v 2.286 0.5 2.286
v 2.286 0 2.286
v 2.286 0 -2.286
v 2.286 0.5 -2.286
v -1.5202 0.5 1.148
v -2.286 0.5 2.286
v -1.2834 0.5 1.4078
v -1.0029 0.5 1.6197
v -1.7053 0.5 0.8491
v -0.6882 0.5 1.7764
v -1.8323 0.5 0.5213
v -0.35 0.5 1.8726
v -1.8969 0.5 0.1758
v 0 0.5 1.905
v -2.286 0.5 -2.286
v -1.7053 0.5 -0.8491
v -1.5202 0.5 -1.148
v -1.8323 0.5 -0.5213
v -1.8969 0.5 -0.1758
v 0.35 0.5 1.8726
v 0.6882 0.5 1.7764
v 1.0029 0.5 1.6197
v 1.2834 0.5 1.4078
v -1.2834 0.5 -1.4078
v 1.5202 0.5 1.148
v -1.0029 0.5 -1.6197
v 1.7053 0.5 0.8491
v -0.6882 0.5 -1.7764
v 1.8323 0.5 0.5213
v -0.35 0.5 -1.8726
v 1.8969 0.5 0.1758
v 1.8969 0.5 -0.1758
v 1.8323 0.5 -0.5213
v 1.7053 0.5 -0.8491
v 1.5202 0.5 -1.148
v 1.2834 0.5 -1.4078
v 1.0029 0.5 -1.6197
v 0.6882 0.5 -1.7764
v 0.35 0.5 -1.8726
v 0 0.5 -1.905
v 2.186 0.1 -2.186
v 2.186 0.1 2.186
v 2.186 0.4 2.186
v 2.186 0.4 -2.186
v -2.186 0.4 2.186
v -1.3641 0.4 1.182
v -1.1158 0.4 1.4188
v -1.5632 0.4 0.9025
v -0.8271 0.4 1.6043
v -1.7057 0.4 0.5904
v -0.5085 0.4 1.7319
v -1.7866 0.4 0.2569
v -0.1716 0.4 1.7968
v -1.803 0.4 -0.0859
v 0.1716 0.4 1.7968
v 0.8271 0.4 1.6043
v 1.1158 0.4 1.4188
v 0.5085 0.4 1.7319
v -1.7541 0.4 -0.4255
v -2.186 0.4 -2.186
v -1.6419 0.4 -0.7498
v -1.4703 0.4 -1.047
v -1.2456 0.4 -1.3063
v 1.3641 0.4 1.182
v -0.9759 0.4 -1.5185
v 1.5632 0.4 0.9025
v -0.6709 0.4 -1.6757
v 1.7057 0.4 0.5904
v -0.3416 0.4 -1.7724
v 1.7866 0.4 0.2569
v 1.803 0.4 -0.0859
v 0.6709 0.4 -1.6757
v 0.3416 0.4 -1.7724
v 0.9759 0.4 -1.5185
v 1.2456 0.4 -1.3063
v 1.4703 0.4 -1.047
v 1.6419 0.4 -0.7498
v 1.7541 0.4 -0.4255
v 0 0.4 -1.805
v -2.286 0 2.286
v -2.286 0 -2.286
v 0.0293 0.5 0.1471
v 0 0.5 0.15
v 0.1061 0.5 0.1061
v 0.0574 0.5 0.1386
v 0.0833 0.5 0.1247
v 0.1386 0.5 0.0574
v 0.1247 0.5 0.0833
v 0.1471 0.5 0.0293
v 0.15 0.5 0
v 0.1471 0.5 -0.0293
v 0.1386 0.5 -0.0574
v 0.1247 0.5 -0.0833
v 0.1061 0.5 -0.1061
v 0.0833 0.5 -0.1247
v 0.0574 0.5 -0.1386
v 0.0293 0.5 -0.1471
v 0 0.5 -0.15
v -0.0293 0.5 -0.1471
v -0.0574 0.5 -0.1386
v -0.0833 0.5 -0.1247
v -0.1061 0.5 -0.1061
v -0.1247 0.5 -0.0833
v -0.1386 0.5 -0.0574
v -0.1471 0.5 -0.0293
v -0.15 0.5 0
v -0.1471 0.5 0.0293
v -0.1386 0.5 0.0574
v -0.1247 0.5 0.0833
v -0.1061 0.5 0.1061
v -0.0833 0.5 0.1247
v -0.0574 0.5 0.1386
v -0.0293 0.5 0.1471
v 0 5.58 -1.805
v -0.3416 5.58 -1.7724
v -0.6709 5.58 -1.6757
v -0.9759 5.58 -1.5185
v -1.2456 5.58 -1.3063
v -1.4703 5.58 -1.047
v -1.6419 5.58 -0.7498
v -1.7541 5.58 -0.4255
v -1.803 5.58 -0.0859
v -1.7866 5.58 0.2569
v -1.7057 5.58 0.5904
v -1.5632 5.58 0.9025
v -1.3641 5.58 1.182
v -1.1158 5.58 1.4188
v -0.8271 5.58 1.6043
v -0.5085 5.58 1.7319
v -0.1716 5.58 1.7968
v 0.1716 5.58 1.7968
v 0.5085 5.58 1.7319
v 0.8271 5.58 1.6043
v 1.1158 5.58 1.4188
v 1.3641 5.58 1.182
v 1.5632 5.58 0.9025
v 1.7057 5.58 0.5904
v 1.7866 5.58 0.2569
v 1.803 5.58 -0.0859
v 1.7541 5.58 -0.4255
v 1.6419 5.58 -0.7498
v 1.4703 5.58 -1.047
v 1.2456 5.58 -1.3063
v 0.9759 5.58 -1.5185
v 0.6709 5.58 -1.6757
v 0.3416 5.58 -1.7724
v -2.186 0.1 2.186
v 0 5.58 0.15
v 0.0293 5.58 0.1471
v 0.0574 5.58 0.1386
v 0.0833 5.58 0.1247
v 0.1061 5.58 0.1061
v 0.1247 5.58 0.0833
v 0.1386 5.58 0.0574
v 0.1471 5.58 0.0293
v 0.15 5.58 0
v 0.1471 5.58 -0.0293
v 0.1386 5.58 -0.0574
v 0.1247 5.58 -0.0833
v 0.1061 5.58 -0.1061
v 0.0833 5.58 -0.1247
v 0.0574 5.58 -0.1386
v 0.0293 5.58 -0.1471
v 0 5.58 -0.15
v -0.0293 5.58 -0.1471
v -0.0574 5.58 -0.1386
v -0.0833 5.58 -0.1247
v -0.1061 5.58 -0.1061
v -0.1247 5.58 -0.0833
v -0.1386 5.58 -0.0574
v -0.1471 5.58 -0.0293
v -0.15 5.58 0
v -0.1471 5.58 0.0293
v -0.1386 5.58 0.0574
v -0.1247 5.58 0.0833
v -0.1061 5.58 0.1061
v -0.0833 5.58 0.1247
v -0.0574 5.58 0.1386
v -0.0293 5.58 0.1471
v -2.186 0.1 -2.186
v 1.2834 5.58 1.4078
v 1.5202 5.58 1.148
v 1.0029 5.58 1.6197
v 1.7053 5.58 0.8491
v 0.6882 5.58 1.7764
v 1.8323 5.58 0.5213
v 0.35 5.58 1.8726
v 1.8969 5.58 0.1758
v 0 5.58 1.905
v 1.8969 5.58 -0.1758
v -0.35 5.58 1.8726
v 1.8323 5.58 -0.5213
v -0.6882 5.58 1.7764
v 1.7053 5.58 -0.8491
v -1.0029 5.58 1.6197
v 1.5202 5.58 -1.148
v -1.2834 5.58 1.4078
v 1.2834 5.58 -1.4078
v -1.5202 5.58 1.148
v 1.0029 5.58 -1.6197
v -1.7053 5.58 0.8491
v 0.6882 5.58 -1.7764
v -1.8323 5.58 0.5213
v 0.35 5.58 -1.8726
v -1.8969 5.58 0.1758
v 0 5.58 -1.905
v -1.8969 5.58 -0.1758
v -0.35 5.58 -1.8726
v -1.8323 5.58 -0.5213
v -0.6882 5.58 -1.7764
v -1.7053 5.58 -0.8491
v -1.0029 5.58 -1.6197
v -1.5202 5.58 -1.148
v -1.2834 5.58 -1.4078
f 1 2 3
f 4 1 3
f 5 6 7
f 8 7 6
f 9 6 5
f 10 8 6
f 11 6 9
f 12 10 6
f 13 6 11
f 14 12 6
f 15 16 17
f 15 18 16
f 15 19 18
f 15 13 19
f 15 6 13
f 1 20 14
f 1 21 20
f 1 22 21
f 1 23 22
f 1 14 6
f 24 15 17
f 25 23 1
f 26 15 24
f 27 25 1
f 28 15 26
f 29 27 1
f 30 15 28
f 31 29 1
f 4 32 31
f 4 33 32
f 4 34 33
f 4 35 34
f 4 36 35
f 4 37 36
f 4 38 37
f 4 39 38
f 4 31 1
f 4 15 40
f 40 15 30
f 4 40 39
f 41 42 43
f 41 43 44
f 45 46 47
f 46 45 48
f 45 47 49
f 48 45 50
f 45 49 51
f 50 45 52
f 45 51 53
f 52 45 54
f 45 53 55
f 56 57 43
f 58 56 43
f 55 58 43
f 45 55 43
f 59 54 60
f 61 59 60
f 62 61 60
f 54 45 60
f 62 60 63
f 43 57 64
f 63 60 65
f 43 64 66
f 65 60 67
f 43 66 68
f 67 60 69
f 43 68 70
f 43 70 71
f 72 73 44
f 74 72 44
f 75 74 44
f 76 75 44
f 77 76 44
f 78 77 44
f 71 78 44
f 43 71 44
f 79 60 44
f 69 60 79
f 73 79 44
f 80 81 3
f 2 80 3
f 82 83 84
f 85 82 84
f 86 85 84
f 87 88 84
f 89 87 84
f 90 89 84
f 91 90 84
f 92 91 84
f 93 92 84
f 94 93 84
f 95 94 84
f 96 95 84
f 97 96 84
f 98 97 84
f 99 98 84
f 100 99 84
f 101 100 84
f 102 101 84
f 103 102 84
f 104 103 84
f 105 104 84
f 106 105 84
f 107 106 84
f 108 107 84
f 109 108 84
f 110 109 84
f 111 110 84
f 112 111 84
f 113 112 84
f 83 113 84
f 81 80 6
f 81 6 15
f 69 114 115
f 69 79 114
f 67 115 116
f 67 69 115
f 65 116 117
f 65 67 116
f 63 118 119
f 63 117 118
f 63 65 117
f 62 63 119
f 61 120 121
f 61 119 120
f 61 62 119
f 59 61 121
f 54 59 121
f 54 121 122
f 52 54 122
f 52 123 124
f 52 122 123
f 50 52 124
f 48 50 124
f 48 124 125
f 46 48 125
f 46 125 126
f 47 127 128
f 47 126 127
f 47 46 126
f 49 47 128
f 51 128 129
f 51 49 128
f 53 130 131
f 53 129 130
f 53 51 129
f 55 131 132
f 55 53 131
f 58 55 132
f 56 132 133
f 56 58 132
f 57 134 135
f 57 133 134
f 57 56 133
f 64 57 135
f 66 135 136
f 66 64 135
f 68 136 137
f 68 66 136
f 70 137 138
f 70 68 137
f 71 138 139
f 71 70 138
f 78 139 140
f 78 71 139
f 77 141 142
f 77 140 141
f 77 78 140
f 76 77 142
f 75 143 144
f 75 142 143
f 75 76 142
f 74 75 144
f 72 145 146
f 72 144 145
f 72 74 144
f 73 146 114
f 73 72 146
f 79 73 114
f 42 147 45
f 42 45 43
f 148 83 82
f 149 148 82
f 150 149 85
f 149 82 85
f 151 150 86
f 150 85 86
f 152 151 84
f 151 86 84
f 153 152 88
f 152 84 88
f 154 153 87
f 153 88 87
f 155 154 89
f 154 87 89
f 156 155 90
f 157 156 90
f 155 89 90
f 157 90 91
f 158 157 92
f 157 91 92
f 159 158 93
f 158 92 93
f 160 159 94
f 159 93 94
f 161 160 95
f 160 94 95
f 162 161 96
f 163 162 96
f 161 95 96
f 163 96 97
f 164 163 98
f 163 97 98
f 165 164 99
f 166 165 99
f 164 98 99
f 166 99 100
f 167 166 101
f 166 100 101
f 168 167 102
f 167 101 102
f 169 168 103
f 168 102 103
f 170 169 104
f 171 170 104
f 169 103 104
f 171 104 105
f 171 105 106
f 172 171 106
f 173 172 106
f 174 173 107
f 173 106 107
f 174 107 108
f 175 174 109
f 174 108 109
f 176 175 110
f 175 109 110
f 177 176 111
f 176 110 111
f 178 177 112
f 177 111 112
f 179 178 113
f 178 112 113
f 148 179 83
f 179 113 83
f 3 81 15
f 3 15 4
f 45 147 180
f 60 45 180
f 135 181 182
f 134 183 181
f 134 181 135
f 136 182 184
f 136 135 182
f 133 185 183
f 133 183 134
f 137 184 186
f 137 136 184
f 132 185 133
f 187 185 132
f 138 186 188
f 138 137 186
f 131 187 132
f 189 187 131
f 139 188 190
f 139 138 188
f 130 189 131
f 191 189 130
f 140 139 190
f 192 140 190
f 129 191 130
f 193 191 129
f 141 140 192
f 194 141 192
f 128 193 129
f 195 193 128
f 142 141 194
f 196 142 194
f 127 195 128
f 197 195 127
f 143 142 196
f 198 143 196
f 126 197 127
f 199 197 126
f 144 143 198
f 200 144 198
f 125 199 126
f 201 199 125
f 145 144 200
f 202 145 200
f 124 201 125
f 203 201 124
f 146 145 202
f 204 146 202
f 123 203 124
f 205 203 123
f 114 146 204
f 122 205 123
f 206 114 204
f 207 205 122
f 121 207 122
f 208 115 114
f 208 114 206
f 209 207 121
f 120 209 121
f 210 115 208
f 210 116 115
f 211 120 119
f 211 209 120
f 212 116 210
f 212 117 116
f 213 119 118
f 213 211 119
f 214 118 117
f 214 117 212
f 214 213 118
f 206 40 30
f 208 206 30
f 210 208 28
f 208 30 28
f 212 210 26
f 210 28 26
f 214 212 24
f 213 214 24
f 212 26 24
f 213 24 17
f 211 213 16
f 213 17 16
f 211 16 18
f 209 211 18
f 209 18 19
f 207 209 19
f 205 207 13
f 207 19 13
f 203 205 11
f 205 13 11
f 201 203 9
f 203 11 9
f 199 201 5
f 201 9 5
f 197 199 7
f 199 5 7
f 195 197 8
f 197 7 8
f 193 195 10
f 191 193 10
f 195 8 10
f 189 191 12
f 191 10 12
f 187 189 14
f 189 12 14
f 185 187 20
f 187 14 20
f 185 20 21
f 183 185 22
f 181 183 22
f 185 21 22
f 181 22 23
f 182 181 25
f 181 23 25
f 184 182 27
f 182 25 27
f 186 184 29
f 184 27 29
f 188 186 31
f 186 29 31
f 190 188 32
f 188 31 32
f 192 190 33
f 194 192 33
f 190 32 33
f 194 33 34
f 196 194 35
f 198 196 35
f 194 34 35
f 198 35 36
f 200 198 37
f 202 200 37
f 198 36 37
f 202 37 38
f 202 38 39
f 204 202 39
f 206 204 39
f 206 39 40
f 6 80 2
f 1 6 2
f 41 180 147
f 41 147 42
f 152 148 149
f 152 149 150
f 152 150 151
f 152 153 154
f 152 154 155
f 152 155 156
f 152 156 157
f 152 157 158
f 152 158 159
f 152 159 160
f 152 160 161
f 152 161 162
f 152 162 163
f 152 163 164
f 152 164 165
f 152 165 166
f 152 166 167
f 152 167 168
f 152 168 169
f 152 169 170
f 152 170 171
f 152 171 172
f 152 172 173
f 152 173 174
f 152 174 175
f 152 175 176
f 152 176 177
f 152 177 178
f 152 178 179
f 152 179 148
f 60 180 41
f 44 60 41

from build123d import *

# Parameters (mm, degrees)
SKETCH2_W           = 4.572
SKETCH2_H           = 4.572
BOSS_EXTRUDE1_DEPTH = 0.5
SKETCH3_R           = 1.905
BOSS_EXTRUDE2_DEPTH = 5.08
SHELL10_T           = -0.1
SKETCH7_R           = 0.15
BOSS_EXTRUDE3_DEPTH = 5.08


with BuildPart() as part:
    # Sketch2 → Boss-Extrude1 (new body)
    with BuildSketch(Plane(origin=(0, 0, 0), x_dir=(1, 0, 0), z_dir=(0, 1, 0))):
        Rectangle(SKETCH2_W, SKETCH2_H)
    extrude(amount=BOSS_EXTRUDE1_DEPTH)

    # Sketch3 → Boss-Extrude2 (add)
    with BuildSketch(Plane(origin=(0, 0.5, 0), x_dir=(1, 0, 0), z_dir=(0, 1, 0))):
        with Locations(Location((0, 0, 0), (0, 0, 90))):
            Circle(SKETCH3_R)
    extrude(amount=BOSS_EXTRUDE2_DEPTH)

    # Shell10
    shell10_openings = [part.faces().sort_by_distance(p)[0] for p in [
        (0, 5.58, 0),
    ]]
    offset(amount=SHELL10_T, openings=shell10_openings, kind=Kind.INTERSECTION)


with BuildPart() as body_2:
    # Sketch7 → Boss-Extrude3 (new body)
    with BuildSketch(Plane(origin=(0, 0.5, 0), x_dir=(1, 0, 0), z_dir=(0, 1, 0))):
        with Locations(Location((0, 0, 0), (0, 0, 270))):
            Circle(SKETCH7_R)
    extrude(amount=BOSS_EXTRUDE3_DEPTH)


solid = Compound([part.part, body_2.part])
